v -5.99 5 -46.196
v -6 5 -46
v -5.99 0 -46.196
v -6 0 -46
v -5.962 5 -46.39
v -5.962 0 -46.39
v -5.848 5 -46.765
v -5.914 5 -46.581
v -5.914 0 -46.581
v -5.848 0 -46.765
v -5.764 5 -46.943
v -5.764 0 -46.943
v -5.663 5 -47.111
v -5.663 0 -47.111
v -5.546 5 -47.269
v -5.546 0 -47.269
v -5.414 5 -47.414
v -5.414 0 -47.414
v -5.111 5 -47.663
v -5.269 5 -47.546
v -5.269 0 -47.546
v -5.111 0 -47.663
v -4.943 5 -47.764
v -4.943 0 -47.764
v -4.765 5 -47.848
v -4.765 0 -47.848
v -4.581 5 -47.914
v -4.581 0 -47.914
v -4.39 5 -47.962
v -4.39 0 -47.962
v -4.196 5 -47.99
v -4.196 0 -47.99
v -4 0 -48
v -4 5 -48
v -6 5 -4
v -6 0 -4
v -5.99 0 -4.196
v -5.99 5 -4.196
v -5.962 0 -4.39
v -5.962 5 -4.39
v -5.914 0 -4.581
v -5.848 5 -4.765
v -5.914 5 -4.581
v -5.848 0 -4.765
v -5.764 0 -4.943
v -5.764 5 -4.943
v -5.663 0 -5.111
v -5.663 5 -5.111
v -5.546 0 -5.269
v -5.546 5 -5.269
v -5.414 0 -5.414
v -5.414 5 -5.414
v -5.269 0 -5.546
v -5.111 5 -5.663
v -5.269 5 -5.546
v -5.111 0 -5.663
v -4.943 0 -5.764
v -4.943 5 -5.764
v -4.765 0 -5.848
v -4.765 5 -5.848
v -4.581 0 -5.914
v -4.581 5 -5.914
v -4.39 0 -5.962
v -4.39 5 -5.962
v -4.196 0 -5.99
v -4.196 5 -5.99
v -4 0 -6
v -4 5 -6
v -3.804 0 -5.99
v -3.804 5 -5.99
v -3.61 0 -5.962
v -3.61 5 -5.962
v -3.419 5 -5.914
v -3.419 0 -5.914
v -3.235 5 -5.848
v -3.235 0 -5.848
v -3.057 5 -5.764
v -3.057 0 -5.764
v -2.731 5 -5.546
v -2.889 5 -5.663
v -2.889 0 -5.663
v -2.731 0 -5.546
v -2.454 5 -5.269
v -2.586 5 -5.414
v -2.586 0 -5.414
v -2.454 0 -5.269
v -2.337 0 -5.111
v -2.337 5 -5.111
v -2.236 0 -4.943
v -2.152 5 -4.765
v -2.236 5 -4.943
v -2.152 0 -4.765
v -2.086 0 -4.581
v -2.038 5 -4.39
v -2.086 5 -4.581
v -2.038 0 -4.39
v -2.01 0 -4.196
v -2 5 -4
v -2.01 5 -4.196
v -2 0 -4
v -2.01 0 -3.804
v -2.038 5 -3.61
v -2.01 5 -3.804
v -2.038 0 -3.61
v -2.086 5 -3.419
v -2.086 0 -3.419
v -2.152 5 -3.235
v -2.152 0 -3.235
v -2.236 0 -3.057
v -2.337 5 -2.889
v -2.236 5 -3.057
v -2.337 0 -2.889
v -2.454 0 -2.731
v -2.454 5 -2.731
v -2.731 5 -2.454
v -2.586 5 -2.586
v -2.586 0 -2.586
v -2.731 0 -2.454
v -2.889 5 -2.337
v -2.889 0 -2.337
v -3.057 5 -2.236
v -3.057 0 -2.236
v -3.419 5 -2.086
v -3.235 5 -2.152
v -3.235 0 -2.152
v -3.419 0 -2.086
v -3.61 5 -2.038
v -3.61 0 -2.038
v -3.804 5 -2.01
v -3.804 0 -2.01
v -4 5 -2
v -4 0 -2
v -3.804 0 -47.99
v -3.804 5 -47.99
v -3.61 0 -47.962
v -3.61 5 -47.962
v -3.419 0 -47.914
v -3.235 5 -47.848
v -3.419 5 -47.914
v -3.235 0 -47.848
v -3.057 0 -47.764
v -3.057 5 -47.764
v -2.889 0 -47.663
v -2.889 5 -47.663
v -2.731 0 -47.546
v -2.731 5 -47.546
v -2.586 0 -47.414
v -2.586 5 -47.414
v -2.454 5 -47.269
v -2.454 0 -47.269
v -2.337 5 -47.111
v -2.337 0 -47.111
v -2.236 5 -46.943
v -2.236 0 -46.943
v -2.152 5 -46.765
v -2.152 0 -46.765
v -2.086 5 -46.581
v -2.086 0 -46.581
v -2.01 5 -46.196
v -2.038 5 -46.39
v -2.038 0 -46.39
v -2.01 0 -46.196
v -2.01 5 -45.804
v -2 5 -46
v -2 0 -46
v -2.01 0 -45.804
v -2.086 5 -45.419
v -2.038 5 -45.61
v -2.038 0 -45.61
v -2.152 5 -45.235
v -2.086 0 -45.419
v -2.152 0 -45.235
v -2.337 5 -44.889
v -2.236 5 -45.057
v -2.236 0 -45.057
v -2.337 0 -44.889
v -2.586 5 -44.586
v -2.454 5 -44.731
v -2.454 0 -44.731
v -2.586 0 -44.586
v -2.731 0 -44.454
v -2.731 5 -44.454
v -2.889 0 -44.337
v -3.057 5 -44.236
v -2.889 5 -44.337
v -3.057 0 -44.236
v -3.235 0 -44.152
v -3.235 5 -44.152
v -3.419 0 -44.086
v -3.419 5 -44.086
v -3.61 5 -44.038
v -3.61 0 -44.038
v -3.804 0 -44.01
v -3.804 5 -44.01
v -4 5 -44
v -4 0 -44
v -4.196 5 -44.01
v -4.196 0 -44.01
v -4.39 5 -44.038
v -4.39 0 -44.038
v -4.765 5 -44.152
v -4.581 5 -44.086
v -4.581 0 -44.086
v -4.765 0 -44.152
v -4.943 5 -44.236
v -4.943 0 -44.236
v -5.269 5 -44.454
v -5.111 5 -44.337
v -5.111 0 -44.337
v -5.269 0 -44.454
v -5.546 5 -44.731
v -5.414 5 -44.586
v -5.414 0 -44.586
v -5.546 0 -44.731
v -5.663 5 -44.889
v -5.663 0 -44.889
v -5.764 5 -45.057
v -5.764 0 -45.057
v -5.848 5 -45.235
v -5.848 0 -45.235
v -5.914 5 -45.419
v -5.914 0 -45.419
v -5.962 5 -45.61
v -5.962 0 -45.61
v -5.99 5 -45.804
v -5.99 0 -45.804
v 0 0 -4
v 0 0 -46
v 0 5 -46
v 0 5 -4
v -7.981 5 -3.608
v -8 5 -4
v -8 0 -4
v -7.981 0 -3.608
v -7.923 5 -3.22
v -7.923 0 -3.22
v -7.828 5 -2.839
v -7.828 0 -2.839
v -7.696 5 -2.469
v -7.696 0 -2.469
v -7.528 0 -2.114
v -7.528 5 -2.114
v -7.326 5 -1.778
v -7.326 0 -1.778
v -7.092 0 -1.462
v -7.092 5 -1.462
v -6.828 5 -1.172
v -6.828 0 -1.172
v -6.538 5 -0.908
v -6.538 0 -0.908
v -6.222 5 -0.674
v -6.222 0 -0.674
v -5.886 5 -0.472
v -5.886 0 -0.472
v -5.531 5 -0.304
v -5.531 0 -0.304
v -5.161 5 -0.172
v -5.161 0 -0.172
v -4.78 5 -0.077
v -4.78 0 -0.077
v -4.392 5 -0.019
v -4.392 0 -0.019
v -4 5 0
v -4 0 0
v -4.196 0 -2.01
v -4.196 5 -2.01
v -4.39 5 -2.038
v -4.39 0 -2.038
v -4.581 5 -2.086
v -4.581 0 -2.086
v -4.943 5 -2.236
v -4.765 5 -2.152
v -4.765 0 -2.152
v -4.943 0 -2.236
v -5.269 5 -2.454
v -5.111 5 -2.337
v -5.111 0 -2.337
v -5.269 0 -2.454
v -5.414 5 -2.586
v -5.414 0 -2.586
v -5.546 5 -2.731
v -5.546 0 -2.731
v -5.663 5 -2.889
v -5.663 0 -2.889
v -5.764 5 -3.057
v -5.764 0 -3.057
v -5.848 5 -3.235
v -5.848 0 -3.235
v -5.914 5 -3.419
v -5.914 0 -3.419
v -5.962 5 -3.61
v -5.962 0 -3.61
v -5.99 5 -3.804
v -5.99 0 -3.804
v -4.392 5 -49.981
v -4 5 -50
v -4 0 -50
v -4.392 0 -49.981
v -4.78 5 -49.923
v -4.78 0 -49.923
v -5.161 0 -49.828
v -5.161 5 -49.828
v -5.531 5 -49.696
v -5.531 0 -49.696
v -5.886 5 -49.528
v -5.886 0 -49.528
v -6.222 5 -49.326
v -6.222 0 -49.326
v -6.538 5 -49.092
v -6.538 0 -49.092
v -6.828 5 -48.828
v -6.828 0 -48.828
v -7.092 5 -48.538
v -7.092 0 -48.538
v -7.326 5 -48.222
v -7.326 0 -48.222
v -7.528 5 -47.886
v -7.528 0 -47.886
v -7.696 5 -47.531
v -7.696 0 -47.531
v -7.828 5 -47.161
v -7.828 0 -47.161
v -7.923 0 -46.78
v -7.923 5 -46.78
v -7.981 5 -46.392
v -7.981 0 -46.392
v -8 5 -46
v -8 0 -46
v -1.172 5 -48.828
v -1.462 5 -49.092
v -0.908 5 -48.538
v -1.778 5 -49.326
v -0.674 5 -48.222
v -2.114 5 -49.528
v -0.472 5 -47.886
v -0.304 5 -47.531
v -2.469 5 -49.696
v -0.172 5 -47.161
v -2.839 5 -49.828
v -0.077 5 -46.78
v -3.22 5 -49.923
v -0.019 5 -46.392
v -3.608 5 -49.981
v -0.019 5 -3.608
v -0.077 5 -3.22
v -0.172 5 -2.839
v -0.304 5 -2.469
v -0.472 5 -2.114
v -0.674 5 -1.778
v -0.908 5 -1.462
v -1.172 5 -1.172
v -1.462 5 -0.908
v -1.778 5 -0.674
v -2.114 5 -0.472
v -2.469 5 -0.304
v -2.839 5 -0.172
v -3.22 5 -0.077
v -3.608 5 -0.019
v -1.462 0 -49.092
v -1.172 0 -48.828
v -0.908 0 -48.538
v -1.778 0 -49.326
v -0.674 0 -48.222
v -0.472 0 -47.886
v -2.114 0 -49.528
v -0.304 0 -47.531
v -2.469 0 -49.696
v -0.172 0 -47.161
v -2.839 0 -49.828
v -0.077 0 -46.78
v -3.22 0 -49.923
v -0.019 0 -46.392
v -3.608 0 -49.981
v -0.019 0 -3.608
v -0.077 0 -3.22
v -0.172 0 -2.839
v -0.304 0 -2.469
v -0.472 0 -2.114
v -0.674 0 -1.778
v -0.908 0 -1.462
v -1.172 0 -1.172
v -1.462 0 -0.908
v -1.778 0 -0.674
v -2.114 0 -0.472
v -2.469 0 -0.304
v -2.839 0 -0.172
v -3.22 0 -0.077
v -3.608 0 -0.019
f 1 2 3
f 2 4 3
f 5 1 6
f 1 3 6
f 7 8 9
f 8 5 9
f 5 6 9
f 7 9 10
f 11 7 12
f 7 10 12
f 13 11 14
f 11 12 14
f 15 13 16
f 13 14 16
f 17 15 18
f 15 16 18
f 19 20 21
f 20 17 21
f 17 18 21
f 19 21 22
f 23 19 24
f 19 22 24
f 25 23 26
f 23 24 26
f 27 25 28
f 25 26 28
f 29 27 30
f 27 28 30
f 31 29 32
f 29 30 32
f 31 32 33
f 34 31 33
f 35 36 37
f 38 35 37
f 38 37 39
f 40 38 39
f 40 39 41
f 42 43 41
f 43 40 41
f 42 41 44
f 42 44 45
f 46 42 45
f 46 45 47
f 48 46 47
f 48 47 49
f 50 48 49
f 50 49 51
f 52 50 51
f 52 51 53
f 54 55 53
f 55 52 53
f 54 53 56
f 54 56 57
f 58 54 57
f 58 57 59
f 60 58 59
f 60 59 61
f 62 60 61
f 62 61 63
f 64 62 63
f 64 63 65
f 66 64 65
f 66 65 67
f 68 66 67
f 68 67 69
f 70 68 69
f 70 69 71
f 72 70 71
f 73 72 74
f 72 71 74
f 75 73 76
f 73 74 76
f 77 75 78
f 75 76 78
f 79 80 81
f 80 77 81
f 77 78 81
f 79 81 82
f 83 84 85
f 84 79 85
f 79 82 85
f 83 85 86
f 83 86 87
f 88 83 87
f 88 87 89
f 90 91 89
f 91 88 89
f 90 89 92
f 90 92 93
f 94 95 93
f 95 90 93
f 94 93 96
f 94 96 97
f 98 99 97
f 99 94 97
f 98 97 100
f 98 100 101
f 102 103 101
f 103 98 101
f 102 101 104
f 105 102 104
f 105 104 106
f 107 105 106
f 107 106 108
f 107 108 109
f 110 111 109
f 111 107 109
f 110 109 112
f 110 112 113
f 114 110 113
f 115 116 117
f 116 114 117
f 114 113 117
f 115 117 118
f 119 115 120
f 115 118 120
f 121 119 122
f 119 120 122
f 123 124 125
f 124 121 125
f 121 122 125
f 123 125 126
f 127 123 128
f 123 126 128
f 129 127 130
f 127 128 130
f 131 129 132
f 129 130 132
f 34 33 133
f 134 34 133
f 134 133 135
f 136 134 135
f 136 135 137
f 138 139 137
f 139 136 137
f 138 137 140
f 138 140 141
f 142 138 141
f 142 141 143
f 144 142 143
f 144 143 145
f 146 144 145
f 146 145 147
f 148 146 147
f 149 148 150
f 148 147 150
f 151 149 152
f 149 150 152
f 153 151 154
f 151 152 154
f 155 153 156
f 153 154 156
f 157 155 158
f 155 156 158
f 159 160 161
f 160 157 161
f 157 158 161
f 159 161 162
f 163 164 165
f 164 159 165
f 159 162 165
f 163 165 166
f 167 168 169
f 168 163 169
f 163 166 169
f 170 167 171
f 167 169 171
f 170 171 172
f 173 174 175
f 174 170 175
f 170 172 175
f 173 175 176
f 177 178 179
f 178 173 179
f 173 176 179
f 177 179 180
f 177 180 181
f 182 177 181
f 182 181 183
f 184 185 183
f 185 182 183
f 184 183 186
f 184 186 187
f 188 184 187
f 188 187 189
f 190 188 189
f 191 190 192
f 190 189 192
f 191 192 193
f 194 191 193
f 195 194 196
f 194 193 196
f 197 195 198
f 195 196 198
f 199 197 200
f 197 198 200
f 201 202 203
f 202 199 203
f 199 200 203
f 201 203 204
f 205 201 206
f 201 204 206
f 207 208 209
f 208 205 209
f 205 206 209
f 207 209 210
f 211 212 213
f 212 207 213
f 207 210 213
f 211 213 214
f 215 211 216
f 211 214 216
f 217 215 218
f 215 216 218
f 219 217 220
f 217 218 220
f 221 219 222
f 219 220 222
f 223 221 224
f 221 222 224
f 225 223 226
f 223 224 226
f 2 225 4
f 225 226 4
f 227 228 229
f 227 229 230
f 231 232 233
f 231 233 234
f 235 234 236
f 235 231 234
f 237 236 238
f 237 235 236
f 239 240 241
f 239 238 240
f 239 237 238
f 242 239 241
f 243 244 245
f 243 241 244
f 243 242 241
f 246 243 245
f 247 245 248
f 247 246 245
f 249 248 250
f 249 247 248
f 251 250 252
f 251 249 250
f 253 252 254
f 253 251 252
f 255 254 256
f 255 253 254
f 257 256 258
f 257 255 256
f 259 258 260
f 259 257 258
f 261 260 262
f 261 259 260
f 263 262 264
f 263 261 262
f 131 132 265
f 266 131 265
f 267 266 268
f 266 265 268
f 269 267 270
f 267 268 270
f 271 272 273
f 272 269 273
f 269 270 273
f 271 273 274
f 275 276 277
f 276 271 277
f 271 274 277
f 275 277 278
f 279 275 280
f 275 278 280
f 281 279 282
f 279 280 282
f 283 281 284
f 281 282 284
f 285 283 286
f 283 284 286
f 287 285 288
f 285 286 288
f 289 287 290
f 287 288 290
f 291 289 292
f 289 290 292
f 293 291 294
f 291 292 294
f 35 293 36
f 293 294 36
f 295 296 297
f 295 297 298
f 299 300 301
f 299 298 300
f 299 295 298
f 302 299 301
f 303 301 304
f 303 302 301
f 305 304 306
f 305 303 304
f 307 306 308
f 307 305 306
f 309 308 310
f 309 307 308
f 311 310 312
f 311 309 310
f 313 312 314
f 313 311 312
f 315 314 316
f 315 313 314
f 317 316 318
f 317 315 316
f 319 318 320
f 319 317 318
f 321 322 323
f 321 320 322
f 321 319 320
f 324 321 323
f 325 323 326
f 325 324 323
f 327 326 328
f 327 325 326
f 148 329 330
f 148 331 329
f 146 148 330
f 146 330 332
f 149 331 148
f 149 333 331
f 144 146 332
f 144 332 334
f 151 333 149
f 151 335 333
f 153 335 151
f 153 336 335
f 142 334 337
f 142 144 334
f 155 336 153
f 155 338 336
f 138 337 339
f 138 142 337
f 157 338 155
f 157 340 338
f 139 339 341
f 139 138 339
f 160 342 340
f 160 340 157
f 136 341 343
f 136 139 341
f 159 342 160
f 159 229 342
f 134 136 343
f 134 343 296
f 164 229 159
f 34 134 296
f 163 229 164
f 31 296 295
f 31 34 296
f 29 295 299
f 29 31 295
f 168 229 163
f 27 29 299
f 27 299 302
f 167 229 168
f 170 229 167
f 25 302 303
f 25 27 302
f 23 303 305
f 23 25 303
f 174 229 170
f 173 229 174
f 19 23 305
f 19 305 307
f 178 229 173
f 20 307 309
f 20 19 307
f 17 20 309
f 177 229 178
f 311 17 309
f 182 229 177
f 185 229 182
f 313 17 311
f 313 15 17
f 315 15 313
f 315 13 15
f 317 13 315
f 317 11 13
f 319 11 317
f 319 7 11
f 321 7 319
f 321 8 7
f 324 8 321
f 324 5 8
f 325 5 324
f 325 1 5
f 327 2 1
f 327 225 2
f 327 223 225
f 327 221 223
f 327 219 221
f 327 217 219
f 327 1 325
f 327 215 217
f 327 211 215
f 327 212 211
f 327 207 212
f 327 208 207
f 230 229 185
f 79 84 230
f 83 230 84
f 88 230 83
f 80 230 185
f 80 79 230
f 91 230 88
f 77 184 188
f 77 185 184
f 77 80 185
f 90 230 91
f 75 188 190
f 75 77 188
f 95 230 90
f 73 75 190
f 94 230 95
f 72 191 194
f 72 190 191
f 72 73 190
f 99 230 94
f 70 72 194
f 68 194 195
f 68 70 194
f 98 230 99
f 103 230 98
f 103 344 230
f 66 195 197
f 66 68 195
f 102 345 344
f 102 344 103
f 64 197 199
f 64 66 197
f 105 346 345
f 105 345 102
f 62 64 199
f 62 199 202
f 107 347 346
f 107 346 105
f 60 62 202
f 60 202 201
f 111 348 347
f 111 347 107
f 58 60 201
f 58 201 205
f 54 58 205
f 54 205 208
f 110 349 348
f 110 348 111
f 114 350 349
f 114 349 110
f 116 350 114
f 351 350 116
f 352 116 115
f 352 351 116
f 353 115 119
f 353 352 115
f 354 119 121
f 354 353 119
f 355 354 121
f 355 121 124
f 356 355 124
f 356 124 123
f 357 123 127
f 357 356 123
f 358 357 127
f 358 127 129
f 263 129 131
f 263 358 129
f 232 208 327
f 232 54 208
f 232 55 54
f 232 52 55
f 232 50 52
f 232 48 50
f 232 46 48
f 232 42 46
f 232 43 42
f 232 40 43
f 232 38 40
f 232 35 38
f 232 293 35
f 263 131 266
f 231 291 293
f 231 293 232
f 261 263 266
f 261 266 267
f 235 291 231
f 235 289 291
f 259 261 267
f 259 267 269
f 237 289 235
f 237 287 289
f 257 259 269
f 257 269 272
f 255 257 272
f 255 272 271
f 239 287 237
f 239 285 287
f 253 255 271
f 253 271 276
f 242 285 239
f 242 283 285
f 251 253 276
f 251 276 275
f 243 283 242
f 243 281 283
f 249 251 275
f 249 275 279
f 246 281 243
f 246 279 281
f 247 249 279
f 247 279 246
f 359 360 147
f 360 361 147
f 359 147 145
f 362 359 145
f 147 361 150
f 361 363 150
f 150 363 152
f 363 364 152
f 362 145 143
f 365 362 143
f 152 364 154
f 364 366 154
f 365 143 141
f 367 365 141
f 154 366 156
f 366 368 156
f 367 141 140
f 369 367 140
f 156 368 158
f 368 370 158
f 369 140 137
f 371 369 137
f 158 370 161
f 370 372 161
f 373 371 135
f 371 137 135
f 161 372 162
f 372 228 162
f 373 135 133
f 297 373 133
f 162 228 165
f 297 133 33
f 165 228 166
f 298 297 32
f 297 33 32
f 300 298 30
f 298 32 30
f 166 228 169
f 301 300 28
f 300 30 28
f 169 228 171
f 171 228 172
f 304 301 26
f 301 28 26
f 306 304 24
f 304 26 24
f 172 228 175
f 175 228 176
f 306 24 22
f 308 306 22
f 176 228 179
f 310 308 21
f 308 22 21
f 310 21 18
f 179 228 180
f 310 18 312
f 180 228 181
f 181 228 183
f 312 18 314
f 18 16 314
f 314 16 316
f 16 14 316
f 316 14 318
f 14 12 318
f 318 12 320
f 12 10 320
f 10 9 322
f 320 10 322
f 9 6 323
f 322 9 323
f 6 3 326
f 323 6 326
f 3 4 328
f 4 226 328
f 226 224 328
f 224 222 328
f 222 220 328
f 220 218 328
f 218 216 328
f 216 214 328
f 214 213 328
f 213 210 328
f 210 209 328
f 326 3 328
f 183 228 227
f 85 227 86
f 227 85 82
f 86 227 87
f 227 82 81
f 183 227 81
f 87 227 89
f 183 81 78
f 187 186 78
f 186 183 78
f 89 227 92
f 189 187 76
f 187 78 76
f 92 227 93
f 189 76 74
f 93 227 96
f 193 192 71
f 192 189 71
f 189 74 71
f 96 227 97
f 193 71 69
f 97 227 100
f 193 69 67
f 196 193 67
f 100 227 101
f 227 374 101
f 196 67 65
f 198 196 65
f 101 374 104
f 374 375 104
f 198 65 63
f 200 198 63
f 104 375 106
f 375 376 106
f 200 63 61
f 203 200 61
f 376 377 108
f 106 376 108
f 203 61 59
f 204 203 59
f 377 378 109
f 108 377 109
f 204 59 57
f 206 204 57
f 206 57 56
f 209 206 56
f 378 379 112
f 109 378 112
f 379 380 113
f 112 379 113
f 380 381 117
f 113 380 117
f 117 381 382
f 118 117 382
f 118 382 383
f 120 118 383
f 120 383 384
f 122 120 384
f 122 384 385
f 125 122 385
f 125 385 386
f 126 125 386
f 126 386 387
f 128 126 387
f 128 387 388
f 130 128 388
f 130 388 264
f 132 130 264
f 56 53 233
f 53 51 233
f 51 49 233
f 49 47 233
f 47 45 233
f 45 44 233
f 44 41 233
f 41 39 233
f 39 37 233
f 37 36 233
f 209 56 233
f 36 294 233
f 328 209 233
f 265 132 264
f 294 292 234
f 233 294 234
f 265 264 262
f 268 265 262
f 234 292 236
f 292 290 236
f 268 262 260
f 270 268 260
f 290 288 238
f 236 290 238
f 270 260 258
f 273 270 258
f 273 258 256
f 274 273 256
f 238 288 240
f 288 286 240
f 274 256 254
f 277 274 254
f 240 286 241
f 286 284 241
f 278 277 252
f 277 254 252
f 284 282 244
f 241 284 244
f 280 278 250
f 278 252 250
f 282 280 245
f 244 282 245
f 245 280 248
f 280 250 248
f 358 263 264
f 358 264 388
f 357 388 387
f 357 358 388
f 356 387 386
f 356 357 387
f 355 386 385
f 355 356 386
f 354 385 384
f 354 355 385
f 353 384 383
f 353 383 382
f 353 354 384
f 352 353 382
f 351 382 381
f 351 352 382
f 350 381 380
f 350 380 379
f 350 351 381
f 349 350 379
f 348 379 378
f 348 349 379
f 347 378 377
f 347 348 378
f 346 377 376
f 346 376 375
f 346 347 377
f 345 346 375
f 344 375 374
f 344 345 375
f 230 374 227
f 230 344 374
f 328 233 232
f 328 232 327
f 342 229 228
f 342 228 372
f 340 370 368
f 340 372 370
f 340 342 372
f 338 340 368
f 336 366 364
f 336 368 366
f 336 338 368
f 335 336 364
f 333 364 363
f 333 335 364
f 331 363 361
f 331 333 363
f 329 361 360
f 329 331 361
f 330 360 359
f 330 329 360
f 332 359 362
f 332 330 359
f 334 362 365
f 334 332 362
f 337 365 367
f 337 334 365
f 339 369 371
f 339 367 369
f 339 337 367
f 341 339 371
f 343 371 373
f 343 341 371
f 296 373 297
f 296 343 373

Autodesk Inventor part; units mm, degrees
ref_plane "YZ Plane" through (0, 0, 0) normal (1, 0, 0) x (0, 1, 0)
ref_plane "XZ Plane" through (0, 0, 0) normal (0, 1, 0) x (-1, 0, 0)
ref_plane "XY Plane" through (0, 0, 0) normal (0, 0, 1) x (1, 0, 0)
sketch "Sketch1" plane through (0, 0, 0) normal (0, 1, 0) x (-1, 0, 0)
  line L0 (0, 0) -> (8, 0)
  line L1 (8, 0) -> (8, -50)
  line L2 (8, -50) -> (0, -50)
  line L3 (0, -50) -> (0, 0)
  line L4 (8, 0) -> (4, 0)
  line L5 (4, 0) -> (4, -4)
  circle A0 centre (4, -4) radius 2
  line L6 (8, -50) -> (4, -50)
  line L7 (4, -50) -> (4, -46)
  circle A1 centre (4, -46) radius 2
  dimension "d0" = 8
  dimension "d1" = 50
  dimension "d2" = 4
  dimension "d3" = 4
  dimension "d4" = 4
  dimension "d5" = 4
  dimension "d6" = 4
  dimension "d7" = 4
extrude "Extrusion1" add sketch "Sketch1" along normal blind 5
fillet "Fillet1" radius 4 4 edges at (0, 2.5, 0) (-8, 2.5, 0) (-8, 2.5, -50) (0, 2.5, -50)
properties part number "Bar2"
